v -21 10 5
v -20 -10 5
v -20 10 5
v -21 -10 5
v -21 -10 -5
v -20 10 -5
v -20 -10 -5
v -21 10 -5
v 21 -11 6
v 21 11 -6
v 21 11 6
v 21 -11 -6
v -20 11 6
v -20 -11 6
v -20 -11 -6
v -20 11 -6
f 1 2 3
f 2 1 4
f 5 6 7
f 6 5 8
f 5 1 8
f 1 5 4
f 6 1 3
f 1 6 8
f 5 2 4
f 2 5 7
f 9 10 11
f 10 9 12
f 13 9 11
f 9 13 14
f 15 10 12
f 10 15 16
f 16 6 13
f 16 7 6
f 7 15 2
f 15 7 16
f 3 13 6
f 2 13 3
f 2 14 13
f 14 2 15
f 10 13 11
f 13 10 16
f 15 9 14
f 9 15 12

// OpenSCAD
// Unit of length: Unit.MM
union()
{
   color(c = [1.0, 0.0, 0.0, 1.0])
   {
      translate(v = [-0.5, 0.0, 0.0])
      {
         cube(size = [41.0, 20.0, 10.0], center = true);
      }
   }
   translate(v = [0.5, 0.0, 0.0])
   {
      cube(size = [41.0, 22.0, 12.0], center = true);
   }
}
